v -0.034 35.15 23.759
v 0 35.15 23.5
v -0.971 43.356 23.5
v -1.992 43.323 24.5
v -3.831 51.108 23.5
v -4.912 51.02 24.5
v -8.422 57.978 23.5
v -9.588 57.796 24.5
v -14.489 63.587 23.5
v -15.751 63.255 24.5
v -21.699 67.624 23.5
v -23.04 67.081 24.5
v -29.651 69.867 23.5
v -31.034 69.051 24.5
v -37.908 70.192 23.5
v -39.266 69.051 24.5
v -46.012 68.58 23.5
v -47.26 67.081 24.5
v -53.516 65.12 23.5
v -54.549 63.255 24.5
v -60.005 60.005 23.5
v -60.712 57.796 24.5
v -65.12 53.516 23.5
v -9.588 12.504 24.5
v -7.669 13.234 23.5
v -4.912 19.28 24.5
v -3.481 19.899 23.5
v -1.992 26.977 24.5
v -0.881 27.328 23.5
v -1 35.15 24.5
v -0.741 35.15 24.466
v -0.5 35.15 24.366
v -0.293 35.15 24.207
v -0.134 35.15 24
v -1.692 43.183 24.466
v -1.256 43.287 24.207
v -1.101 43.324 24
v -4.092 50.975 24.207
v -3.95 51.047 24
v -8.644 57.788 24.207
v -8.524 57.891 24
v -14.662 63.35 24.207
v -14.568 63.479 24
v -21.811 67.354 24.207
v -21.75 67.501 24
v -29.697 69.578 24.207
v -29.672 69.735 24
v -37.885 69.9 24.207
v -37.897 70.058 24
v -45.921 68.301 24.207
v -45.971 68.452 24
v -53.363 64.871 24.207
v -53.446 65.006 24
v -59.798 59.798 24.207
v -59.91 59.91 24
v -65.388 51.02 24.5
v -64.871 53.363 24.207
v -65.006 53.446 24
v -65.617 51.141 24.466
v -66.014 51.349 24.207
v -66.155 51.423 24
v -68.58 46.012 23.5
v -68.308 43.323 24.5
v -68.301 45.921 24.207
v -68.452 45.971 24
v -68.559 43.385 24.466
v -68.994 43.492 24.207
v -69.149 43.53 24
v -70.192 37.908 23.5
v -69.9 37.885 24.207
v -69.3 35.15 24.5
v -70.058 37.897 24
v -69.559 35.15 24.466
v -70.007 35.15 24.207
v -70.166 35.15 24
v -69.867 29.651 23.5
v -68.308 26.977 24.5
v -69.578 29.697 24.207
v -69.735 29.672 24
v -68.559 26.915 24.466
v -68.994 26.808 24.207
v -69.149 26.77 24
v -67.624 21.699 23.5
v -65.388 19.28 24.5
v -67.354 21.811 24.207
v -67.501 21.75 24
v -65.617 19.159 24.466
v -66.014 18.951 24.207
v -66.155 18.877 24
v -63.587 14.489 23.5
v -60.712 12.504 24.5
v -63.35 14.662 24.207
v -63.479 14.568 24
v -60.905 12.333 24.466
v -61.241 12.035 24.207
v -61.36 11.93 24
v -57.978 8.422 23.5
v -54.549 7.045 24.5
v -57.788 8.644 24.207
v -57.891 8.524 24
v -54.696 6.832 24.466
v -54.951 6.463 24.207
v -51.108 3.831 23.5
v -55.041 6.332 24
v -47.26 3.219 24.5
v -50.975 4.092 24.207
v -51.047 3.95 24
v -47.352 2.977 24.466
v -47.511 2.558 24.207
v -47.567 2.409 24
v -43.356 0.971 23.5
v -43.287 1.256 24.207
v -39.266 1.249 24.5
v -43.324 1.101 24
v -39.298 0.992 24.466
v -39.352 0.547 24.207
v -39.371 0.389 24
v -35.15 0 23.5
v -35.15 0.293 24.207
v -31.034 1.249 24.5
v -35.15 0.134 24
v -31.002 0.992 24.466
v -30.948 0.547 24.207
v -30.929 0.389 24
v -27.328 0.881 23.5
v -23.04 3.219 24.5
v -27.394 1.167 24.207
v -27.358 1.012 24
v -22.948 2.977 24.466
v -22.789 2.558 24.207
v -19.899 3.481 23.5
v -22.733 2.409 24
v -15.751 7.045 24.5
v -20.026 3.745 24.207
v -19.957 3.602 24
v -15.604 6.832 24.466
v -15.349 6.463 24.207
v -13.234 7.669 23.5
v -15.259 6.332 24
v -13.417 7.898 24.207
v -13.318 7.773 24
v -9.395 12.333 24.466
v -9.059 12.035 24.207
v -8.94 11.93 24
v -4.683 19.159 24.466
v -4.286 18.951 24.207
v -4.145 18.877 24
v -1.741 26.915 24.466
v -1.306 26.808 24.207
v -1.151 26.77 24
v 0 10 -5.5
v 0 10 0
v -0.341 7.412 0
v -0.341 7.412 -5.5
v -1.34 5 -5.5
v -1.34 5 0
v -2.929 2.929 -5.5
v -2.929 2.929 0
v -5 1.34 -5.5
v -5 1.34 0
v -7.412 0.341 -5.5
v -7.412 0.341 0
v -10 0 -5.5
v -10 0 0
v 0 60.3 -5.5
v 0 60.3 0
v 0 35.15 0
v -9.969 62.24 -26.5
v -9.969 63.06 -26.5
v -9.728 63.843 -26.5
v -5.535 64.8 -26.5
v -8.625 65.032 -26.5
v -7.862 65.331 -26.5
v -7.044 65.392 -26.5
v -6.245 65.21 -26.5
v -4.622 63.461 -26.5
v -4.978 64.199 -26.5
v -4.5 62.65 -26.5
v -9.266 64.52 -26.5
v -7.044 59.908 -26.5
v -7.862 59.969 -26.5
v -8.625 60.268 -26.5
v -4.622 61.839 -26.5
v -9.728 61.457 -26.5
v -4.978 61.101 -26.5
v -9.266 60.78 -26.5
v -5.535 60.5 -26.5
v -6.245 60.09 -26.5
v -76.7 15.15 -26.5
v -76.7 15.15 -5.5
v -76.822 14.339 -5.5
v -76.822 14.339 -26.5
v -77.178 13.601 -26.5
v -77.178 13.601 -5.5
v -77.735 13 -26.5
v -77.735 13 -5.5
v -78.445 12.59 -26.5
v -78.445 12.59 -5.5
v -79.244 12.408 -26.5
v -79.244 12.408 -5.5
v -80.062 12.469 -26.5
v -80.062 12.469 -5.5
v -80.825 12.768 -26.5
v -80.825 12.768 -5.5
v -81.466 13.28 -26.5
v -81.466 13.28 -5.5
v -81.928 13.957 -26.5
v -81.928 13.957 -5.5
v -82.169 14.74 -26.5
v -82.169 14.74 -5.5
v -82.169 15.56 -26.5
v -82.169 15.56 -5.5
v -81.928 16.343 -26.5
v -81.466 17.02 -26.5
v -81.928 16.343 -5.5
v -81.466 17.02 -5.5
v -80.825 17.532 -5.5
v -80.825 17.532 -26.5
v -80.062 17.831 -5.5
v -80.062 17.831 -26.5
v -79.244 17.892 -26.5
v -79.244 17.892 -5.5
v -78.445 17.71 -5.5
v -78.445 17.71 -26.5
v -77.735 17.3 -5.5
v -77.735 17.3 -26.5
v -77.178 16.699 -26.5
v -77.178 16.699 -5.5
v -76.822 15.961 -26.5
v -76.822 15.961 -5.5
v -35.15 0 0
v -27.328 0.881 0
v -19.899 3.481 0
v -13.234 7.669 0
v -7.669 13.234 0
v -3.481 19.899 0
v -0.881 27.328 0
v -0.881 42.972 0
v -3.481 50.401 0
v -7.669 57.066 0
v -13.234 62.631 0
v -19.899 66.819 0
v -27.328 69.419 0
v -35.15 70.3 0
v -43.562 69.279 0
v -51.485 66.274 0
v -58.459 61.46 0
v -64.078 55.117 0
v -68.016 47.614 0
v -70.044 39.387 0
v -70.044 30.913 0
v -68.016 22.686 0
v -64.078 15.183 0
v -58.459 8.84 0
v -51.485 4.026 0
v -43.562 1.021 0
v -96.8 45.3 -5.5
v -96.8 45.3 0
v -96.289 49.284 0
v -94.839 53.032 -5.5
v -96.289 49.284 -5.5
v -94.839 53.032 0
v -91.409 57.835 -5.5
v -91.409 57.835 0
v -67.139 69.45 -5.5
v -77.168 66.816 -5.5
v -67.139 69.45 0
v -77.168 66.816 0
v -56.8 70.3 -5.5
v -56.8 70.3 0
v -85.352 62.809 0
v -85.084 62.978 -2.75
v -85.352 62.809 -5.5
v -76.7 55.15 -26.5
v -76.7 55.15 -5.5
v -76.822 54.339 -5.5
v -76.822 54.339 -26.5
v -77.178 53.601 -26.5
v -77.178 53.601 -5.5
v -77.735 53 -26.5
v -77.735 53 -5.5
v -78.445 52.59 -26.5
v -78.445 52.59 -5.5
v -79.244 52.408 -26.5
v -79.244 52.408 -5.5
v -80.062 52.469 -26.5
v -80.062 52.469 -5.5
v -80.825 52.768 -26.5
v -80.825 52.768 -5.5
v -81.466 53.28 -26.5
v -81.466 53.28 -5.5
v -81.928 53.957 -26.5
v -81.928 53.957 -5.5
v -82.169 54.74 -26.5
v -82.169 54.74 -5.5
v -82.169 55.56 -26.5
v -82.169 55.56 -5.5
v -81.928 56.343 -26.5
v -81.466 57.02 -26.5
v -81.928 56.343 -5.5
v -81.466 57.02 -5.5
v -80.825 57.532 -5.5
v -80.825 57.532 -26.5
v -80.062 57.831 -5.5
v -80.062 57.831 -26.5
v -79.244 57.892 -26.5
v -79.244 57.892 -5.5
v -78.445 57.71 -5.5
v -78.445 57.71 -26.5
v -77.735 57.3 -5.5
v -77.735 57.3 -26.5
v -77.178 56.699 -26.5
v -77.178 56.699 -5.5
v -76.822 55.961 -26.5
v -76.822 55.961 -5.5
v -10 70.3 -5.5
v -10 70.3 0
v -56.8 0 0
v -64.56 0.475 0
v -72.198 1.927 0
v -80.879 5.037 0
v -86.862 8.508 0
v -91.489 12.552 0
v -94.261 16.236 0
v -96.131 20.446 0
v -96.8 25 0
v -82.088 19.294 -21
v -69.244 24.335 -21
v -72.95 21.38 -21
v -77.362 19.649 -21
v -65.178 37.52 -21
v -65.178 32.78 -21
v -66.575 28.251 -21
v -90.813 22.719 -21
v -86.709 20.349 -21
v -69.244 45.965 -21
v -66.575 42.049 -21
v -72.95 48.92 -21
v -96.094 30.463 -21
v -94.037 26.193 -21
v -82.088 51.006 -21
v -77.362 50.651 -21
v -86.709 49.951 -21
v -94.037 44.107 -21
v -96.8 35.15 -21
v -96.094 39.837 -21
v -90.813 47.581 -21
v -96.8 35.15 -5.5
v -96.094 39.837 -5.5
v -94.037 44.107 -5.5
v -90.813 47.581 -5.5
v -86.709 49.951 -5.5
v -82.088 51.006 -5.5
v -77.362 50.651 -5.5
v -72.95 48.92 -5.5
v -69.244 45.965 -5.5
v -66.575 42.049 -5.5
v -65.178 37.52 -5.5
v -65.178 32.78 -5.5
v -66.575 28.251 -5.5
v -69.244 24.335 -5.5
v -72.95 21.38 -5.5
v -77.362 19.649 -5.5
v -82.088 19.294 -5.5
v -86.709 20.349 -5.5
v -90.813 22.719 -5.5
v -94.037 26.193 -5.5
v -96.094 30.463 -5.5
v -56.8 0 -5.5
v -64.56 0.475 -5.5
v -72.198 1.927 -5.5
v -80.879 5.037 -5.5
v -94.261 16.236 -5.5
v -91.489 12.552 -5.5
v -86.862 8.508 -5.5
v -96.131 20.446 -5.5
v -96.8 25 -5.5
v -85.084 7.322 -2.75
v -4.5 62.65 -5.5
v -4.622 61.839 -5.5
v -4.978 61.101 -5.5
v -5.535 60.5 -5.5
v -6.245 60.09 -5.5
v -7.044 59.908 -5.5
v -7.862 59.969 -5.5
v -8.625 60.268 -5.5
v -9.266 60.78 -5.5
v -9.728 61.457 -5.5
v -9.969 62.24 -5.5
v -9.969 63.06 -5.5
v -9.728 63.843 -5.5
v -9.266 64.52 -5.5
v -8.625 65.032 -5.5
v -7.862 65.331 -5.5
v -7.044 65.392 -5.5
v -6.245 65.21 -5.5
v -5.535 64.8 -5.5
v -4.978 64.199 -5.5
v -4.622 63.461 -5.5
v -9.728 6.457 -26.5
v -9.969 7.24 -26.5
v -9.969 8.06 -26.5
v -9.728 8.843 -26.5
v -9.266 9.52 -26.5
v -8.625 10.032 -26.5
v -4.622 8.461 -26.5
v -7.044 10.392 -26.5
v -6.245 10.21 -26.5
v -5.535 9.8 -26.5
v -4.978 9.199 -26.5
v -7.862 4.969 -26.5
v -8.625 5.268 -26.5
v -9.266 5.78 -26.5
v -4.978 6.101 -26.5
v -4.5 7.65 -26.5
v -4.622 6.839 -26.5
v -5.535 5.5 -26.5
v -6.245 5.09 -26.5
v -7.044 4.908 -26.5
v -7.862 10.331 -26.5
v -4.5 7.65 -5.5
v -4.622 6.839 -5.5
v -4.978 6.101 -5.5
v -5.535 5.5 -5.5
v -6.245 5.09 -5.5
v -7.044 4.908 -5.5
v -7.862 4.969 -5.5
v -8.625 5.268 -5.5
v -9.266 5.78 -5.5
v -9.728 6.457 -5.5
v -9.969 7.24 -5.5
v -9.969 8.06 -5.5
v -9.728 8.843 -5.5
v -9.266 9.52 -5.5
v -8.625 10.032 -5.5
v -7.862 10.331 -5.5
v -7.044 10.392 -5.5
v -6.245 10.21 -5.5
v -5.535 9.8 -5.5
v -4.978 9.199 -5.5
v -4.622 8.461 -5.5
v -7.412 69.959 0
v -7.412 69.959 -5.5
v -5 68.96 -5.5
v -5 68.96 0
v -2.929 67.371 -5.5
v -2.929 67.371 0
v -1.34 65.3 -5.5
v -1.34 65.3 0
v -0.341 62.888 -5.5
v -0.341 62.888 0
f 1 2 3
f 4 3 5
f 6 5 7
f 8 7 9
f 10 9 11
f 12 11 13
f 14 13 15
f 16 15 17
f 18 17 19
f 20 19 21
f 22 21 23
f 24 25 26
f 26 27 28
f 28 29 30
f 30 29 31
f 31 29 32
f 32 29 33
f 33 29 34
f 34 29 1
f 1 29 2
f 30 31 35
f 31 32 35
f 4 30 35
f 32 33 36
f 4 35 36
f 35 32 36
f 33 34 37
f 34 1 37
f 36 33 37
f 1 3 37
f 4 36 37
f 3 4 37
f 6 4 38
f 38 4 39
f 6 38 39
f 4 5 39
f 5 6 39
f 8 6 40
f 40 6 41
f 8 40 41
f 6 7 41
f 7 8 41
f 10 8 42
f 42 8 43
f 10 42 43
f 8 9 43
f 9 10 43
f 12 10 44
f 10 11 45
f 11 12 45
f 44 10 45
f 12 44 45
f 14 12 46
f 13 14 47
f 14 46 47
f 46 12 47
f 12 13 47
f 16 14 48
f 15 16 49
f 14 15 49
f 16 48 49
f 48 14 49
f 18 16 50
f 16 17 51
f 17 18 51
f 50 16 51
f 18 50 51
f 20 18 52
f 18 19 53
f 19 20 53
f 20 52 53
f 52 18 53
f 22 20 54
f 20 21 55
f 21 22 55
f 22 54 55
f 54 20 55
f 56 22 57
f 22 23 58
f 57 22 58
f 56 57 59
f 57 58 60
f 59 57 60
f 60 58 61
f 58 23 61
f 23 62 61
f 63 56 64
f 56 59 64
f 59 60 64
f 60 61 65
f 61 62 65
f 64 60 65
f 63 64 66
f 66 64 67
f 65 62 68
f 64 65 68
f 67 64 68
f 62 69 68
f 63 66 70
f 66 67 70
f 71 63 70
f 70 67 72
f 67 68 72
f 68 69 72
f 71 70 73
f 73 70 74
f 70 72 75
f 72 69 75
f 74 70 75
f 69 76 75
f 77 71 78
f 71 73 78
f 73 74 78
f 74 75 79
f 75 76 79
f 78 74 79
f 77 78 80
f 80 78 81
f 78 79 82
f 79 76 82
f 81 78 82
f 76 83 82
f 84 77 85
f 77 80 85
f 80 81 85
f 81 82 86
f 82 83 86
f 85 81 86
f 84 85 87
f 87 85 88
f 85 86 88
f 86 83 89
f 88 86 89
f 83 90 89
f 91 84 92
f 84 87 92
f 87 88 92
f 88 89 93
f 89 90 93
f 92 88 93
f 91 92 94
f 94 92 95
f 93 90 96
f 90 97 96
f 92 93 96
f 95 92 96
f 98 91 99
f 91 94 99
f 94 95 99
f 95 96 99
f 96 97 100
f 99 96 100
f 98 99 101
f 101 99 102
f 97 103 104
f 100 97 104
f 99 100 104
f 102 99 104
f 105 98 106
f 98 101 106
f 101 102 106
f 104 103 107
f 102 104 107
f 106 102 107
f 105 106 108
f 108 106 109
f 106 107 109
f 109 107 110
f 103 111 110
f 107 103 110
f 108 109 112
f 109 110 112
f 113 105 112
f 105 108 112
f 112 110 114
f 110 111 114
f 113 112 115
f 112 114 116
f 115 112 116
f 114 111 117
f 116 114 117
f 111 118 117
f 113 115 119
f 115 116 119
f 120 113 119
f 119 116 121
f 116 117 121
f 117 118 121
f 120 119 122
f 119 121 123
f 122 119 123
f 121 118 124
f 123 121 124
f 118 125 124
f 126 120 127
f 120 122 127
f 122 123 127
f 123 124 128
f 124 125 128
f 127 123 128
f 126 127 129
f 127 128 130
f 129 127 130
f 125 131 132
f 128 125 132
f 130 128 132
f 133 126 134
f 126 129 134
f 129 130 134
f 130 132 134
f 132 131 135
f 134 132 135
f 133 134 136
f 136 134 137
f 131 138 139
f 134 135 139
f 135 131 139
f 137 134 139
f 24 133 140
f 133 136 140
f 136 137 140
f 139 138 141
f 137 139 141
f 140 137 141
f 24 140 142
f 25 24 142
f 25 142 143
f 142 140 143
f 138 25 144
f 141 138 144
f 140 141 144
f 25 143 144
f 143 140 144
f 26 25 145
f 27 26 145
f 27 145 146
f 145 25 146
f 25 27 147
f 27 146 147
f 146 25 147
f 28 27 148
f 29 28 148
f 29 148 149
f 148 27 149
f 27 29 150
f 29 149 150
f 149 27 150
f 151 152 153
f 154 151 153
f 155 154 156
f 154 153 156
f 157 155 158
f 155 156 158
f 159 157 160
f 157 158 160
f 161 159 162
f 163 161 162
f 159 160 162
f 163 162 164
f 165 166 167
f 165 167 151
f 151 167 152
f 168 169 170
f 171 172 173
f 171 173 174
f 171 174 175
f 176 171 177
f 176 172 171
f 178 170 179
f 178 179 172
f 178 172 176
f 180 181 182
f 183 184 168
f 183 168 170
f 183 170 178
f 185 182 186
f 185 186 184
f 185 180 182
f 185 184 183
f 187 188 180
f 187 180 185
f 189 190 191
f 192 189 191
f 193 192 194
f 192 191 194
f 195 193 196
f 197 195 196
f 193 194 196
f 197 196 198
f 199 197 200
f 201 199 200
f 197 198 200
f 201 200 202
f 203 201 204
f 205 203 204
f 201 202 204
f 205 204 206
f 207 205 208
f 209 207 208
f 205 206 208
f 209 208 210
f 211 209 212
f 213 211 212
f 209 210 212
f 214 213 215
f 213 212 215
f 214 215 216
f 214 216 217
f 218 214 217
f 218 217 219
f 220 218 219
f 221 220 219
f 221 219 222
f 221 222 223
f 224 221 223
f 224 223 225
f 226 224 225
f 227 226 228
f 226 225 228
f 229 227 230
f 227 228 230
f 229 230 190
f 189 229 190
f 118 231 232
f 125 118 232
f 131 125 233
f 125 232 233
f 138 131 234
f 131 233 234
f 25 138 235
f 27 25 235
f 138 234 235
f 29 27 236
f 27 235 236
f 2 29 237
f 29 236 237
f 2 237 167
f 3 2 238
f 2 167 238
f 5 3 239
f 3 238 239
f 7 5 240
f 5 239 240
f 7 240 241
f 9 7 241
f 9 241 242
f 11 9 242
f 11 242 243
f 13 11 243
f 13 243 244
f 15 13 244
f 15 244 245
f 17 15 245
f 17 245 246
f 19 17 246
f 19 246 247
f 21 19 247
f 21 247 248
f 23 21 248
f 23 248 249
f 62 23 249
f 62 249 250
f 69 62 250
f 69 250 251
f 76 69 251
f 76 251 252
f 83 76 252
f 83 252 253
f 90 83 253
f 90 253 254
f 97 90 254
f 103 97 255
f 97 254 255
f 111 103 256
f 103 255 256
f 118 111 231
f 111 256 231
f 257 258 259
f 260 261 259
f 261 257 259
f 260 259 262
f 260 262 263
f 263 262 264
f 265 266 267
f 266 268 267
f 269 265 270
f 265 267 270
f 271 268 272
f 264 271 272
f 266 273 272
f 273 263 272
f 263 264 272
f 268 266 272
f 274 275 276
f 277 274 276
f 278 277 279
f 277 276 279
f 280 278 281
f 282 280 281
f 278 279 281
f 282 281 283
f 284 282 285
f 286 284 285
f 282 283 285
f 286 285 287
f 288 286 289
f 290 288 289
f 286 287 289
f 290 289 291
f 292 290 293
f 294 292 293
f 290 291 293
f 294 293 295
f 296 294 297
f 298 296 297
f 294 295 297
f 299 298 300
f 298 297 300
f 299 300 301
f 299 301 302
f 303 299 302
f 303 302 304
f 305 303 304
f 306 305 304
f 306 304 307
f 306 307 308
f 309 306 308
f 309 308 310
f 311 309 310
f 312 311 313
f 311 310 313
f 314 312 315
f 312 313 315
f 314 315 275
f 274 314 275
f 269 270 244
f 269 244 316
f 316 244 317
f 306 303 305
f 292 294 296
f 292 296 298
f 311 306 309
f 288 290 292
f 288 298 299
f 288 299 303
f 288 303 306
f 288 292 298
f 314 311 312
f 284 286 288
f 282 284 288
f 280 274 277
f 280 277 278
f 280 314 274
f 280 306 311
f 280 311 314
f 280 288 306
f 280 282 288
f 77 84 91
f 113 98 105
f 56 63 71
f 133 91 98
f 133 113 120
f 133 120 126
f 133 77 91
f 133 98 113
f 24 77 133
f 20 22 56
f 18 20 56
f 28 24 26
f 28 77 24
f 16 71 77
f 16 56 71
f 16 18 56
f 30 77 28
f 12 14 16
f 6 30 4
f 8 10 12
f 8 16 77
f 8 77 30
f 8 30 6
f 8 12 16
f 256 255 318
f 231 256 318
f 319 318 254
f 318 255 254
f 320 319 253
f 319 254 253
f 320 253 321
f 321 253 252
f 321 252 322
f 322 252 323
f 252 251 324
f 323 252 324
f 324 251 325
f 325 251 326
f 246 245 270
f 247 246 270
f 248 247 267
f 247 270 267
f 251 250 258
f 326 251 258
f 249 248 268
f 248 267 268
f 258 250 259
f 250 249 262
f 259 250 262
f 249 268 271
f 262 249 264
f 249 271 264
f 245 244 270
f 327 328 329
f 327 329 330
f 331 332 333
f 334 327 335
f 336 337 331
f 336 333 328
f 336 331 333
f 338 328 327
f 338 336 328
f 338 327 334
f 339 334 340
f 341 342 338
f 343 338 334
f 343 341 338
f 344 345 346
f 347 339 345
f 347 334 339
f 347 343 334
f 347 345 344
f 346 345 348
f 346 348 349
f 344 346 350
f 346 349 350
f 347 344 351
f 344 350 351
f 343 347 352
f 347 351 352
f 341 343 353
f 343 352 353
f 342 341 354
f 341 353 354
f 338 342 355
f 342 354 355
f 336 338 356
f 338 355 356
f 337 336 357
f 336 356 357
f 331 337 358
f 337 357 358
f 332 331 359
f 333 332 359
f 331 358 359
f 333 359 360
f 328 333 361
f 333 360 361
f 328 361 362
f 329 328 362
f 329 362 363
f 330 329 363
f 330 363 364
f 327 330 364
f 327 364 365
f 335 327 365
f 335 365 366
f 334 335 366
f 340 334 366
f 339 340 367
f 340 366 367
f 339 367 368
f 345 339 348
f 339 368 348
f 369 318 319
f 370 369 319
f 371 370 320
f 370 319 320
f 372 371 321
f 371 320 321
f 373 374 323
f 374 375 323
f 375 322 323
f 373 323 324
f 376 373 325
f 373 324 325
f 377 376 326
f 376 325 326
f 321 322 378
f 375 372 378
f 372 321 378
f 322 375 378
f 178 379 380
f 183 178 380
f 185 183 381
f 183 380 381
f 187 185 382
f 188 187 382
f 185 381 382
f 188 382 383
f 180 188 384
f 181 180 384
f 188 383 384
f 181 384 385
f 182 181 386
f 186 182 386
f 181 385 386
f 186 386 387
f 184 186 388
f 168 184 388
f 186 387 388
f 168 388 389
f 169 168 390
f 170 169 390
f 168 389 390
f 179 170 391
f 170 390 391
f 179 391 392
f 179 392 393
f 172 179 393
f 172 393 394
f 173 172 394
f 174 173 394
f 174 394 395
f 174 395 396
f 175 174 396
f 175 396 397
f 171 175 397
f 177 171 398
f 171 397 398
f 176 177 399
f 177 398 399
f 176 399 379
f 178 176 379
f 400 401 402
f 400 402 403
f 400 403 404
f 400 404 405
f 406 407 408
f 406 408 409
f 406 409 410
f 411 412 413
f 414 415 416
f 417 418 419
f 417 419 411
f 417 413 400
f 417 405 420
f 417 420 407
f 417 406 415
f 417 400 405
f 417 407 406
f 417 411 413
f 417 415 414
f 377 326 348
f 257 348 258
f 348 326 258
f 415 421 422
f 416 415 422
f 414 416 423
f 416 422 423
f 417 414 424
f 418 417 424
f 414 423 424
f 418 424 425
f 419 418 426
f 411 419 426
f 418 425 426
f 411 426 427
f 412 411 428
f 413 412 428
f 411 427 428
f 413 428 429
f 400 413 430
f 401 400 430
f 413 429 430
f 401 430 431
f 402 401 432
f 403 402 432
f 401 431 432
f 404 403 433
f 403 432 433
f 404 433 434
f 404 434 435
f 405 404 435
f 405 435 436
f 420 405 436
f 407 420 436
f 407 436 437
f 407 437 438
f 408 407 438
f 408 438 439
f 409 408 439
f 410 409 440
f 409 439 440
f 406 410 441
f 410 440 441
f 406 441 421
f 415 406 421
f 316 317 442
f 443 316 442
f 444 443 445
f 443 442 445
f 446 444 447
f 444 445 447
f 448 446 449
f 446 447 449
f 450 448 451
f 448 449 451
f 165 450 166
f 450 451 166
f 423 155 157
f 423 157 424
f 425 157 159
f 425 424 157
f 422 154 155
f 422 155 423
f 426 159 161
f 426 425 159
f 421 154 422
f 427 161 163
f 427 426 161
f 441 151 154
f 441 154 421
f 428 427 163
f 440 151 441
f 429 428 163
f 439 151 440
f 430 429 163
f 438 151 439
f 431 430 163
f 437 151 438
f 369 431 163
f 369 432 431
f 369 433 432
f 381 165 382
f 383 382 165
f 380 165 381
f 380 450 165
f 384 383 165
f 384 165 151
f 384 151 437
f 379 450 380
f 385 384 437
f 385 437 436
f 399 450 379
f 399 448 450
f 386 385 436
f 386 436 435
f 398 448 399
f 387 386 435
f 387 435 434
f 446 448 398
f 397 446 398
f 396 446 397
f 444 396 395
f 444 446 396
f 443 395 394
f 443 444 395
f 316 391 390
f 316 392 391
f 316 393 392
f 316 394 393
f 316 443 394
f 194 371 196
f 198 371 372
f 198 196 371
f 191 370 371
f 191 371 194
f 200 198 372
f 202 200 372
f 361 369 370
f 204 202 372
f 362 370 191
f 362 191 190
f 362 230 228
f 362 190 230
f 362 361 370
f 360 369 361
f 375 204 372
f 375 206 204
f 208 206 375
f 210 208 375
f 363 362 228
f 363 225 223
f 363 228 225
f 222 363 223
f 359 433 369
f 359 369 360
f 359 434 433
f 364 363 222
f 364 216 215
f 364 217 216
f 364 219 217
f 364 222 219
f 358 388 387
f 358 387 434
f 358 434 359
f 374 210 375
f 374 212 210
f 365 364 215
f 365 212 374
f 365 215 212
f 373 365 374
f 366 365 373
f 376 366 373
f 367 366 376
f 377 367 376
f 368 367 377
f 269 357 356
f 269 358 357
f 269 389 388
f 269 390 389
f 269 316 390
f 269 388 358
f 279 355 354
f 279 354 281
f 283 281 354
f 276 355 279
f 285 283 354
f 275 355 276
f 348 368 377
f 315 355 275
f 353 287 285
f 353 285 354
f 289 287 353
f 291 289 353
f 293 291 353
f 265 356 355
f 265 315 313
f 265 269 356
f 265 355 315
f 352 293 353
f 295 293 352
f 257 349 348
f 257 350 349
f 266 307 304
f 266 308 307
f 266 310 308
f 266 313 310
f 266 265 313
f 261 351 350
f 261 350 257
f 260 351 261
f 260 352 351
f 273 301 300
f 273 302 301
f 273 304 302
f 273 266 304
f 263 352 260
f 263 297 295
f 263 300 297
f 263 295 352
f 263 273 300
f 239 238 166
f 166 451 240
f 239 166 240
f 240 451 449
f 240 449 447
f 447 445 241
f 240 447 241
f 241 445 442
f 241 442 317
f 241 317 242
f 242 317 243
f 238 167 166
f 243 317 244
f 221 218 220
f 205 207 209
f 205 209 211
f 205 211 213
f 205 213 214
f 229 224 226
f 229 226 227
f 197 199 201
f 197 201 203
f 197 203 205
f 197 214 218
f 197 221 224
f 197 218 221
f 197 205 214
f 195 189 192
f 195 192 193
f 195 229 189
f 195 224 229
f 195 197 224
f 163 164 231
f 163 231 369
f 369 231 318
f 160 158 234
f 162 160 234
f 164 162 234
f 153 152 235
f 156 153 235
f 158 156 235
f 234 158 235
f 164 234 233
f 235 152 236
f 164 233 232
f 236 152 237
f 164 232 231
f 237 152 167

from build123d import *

# Parameters (mm, degrees)
EXTRUDE_1_DEPTH = 5.5
EXTRUDE_2_DEPTH = 24.5
FILLET_1_SIZE   = 25
FILLET_1_SIZE_2 = 40
EXTRUDE_3_DEPTH = 15.5
SKETCH_2_3_R    = 2.750000000000008
SKETCH_2_3_R_2  = 2.7499999999999982
SKETCH_2_3_R_3  = 2.7499999999999987
SKETCH_2_3_R_4  = 2.7500000000000084
EXTRUDE_4_DEPTH = 21


with BuildPart() as part:
    # 草图1 → 凸台-拉伸1 (new body)
    with BuildSketch(Plane.XY):
        with BuildLine():
            Line((-10.000000000000071, 0), (-96.8, 0))
            Line((-96.8, 0), (-96.8, 70.29999999999998))
            Line((-96.8, 70.29999999999998), (-10.000000000000071, 70.3))
            ThreePointArc((-10.000000000000071, 70.3), (-2.928932188134527, 67.37106781186547), (0, 60.29999999999993))
            Line((0, 60.29999999999993), (0, 10.000000000000071))
            ThreePointArc((0, 10.000000000000071), (-2.9289321881345236, 2.9289321881345245), (-10.000000000000071, 0))
        make_face()
    extrude(amount=-EXTRUDE_1_DEPTH)

    # 草图1<4> → 凸台-拉伸2 (add)
    with BuildSketch(Plane.XY):
        with BuildLine():
            ThreePointArc((-35.15, 70.29999999999998), (-70.3, 35.15), (-35.150000000000006, -7.11e-15))
            Line((-35.15, 0), (-35.15, 70.3))
        make_face()
        with BuildLine():
            Line((-35.15, 70.3), (-35.15, 0))
            ThreePointArc((-35.150000000000006, -7.11e-15), (-10.295196641292861, 10.29519664129284), (0, 35.149999999999984))
            ThreePointArc((0, 35.14999999999999), (-10.295196641292854, 60.004803358707136), (-35.15, 70.29999999999998))
        make_face()
    extrude(amount=EXTRUDE_2_DEPTH)

    # 圆角1
    # a fillet whose section is not a circle: 40, 25 mm, written as the material it takes off along each edge
    with BuildSketch(Plane(origin=(-96.8, 70.29999999999998, 100.00000000000001), x_dir=(0, -1, 0), z_dir=(0, 0, -1))) as fillet_1_piece_1:
        with BuildLine():
            Bezier((FILLET_1_SIZE, 0), (0, 0), (0, -FILLET_1_SIZE_2), weights=[1, 0.7071067811865476, 1])
            Line((0, -FILLET_1_SIZE_2), (0, 0))
            Line((0, 0), (FILLET_1_SIZE, 0))
        make_face()
    extrude(amount=205.50000000000003, mode=Mode.SUBTRACT)
    with BuildSketch(Plane(origin=(-96.8, 0, 100.00000000000001), x_dir=(1, 0, 0), z_dir=(0, 0, -1))) as fillet_1_piece_2:
        with BuildLine():
            Bezier((FILLET_1_SIZE_2, 0), (0, 0), (0, -FILLET_1_SIZE), weights=[1, 0.7071067811865476, 1])
            Line((0, -FILLET_1_SIZE), (0, 0))
            Line((0, 0), (FILLET_1_SIZE_2, 0))
        make_face()
    extrude(amount=205.50000000000003, mode=Mode.SUBTRACT)

    # 圆角2: read off the stored shape, not the designer's step
    # 圆角2 outline → 圆角2 (revolve, cut)
    with BuildSketch(Plane(origin=(-35.15, 35.15, 0), x_dir=(1, 0, 0), z_dir=(0, -1, 0))):
        with BuildLine():
            ThreePointArc((34.15, 24.5), (34.857106781, 24.207106781), (35.15, 23.5))
            Line((35.15, 23.5), (35.15, 24.5))
            Line((35.15, 24.5), (34.15, 24.5))
        make_face()
    revolve(axis=Axis((-35.15, 35.15, 0), (0, 0, 1)), mode=Mode.SUBTRACT)

    # 草图2 → 凸台-拉伸3 (add)
    with BuildSketch(Plane(origin=(0, 0, -5.5), x_dir=(-1, 0, 0), z_dir=(0, 0, -1))):
        with BuildLine():
            ThreePointArc((65, 35.14999999999999), (80.9, 19.249999999999993), (96.80000000000001, 35.149999999999984))
            Line((96.8, 35.15), (65, 35.149999999999984))
        make_face()
        with BuildLine():
            Line((65, 35.149999999999984), (96.8, 35.15))
            ThreePointArc((96.80000000000001, 35.14999999999999), (80.9, 51.04999999999999), (65, 35.14999999999999))
        make_face()
    extrude(amount=EXTRUDE_3_DEPTH)

    # 草图2<3> → 凸台-拉伸4 (add)
    with BuildSketch(Plane(origin=(0, 0, -5.5), x_dir=(-1, 0, 0), z_dir=(0, 0, -1))):
        with Locations(Location((79.45, 15.149999999999999, 0), (0, 0, 180))):
            Circle(SKETCH_2_3_R)
        with Locations(Location((7.250000000000006, 7.64999999999999, 0), (0, 0, 180))):
            Circle(SKETCH_2_3_R_2)
        with Locations(Location((7.249999999999993, 62.65, 0), (0, 0, 180))):
            Circle(SKETCH_2_3_R_3)
        with Locations(Location((79.44999999999999, 55.15, 0), (0, 0, 180))):
            Circle(SKETCH_2_3_R_4)
    extrude(amount=EXTRUDE_4_DEPTH)


solid = part.part
